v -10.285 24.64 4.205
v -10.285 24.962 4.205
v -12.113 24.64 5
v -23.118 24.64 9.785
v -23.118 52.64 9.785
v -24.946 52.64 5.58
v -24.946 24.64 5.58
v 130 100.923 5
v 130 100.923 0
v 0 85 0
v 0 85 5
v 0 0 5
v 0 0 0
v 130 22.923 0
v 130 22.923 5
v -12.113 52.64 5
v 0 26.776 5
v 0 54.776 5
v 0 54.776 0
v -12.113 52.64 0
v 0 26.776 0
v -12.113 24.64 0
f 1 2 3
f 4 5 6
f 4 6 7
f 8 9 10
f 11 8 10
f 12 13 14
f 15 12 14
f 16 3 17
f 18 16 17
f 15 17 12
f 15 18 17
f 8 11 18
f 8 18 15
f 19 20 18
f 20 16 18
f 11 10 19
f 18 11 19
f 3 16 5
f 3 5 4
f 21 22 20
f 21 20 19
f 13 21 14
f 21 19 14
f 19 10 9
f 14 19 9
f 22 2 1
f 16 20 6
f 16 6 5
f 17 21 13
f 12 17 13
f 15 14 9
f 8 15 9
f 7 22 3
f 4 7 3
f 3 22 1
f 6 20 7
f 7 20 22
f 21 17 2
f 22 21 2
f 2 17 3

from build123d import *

# Parameters (mm, degrees)
RESSALTO_EXTRUS_O1_DEPTH      = 5
RESSALTO_EXTRUS_O2_DEPTH      = 5
RESSALTO_EXTRUS_O3_DEPTH      = 12
RESSALTO_EXTRUS_O3_DEPTH_BACK = 1.993745
ESBO_O4_W                     = 28
ESBO_O4_H                     = 4.585300372


with BuildPart() as part:
    # Esboço1 → Ressalto-extrusão1 (new body)
    with BuildSketch(Plane.XY):
        Polygon((0, 85), (0, 0), (130, 22.922507492), (130, 100.922507492), align=None)
    extrude(amount=RESSALTO_EXTRUS_O1_DEPTH)

    # Esboço3 → Ressalto-extrusão2 (add)
    with BuildSketch(Plane.XY.offset(5)):
        Polygon((-12.113135362, 52.639941774), (0, 54.775814359), (0, 26.775814359), (-12.113135362, 24.639941774), align=None)
    extrude(amount=-RESSALTO_EXTRUS_O2_DEPTH)

    # Esboço4 → Ressalto-extrusão3 (add, two sides: drawn at the far end of the back side and taken through both)
    with BuildSketch(Plane(origin=(-12.015521161, 0, 5.224497292), x_dir=(0, -1, 0), z_dir=(-0.9170600743851252, 0, 0.39874906892524387)).offset(-RESSALTO_EXTRUS_O3_DEPTH_BACK)):
        with Locations((-38.639941774, -2.537451261)):
            Rectangle(ESBO_O4_W, ESBO_O4_H)
    extrude(amount=RESSALTO_EXTRUS_O3_DEPTH + RESSALTO_EXTRUS_O3_DEPTH_BACK)


solid = part.part
